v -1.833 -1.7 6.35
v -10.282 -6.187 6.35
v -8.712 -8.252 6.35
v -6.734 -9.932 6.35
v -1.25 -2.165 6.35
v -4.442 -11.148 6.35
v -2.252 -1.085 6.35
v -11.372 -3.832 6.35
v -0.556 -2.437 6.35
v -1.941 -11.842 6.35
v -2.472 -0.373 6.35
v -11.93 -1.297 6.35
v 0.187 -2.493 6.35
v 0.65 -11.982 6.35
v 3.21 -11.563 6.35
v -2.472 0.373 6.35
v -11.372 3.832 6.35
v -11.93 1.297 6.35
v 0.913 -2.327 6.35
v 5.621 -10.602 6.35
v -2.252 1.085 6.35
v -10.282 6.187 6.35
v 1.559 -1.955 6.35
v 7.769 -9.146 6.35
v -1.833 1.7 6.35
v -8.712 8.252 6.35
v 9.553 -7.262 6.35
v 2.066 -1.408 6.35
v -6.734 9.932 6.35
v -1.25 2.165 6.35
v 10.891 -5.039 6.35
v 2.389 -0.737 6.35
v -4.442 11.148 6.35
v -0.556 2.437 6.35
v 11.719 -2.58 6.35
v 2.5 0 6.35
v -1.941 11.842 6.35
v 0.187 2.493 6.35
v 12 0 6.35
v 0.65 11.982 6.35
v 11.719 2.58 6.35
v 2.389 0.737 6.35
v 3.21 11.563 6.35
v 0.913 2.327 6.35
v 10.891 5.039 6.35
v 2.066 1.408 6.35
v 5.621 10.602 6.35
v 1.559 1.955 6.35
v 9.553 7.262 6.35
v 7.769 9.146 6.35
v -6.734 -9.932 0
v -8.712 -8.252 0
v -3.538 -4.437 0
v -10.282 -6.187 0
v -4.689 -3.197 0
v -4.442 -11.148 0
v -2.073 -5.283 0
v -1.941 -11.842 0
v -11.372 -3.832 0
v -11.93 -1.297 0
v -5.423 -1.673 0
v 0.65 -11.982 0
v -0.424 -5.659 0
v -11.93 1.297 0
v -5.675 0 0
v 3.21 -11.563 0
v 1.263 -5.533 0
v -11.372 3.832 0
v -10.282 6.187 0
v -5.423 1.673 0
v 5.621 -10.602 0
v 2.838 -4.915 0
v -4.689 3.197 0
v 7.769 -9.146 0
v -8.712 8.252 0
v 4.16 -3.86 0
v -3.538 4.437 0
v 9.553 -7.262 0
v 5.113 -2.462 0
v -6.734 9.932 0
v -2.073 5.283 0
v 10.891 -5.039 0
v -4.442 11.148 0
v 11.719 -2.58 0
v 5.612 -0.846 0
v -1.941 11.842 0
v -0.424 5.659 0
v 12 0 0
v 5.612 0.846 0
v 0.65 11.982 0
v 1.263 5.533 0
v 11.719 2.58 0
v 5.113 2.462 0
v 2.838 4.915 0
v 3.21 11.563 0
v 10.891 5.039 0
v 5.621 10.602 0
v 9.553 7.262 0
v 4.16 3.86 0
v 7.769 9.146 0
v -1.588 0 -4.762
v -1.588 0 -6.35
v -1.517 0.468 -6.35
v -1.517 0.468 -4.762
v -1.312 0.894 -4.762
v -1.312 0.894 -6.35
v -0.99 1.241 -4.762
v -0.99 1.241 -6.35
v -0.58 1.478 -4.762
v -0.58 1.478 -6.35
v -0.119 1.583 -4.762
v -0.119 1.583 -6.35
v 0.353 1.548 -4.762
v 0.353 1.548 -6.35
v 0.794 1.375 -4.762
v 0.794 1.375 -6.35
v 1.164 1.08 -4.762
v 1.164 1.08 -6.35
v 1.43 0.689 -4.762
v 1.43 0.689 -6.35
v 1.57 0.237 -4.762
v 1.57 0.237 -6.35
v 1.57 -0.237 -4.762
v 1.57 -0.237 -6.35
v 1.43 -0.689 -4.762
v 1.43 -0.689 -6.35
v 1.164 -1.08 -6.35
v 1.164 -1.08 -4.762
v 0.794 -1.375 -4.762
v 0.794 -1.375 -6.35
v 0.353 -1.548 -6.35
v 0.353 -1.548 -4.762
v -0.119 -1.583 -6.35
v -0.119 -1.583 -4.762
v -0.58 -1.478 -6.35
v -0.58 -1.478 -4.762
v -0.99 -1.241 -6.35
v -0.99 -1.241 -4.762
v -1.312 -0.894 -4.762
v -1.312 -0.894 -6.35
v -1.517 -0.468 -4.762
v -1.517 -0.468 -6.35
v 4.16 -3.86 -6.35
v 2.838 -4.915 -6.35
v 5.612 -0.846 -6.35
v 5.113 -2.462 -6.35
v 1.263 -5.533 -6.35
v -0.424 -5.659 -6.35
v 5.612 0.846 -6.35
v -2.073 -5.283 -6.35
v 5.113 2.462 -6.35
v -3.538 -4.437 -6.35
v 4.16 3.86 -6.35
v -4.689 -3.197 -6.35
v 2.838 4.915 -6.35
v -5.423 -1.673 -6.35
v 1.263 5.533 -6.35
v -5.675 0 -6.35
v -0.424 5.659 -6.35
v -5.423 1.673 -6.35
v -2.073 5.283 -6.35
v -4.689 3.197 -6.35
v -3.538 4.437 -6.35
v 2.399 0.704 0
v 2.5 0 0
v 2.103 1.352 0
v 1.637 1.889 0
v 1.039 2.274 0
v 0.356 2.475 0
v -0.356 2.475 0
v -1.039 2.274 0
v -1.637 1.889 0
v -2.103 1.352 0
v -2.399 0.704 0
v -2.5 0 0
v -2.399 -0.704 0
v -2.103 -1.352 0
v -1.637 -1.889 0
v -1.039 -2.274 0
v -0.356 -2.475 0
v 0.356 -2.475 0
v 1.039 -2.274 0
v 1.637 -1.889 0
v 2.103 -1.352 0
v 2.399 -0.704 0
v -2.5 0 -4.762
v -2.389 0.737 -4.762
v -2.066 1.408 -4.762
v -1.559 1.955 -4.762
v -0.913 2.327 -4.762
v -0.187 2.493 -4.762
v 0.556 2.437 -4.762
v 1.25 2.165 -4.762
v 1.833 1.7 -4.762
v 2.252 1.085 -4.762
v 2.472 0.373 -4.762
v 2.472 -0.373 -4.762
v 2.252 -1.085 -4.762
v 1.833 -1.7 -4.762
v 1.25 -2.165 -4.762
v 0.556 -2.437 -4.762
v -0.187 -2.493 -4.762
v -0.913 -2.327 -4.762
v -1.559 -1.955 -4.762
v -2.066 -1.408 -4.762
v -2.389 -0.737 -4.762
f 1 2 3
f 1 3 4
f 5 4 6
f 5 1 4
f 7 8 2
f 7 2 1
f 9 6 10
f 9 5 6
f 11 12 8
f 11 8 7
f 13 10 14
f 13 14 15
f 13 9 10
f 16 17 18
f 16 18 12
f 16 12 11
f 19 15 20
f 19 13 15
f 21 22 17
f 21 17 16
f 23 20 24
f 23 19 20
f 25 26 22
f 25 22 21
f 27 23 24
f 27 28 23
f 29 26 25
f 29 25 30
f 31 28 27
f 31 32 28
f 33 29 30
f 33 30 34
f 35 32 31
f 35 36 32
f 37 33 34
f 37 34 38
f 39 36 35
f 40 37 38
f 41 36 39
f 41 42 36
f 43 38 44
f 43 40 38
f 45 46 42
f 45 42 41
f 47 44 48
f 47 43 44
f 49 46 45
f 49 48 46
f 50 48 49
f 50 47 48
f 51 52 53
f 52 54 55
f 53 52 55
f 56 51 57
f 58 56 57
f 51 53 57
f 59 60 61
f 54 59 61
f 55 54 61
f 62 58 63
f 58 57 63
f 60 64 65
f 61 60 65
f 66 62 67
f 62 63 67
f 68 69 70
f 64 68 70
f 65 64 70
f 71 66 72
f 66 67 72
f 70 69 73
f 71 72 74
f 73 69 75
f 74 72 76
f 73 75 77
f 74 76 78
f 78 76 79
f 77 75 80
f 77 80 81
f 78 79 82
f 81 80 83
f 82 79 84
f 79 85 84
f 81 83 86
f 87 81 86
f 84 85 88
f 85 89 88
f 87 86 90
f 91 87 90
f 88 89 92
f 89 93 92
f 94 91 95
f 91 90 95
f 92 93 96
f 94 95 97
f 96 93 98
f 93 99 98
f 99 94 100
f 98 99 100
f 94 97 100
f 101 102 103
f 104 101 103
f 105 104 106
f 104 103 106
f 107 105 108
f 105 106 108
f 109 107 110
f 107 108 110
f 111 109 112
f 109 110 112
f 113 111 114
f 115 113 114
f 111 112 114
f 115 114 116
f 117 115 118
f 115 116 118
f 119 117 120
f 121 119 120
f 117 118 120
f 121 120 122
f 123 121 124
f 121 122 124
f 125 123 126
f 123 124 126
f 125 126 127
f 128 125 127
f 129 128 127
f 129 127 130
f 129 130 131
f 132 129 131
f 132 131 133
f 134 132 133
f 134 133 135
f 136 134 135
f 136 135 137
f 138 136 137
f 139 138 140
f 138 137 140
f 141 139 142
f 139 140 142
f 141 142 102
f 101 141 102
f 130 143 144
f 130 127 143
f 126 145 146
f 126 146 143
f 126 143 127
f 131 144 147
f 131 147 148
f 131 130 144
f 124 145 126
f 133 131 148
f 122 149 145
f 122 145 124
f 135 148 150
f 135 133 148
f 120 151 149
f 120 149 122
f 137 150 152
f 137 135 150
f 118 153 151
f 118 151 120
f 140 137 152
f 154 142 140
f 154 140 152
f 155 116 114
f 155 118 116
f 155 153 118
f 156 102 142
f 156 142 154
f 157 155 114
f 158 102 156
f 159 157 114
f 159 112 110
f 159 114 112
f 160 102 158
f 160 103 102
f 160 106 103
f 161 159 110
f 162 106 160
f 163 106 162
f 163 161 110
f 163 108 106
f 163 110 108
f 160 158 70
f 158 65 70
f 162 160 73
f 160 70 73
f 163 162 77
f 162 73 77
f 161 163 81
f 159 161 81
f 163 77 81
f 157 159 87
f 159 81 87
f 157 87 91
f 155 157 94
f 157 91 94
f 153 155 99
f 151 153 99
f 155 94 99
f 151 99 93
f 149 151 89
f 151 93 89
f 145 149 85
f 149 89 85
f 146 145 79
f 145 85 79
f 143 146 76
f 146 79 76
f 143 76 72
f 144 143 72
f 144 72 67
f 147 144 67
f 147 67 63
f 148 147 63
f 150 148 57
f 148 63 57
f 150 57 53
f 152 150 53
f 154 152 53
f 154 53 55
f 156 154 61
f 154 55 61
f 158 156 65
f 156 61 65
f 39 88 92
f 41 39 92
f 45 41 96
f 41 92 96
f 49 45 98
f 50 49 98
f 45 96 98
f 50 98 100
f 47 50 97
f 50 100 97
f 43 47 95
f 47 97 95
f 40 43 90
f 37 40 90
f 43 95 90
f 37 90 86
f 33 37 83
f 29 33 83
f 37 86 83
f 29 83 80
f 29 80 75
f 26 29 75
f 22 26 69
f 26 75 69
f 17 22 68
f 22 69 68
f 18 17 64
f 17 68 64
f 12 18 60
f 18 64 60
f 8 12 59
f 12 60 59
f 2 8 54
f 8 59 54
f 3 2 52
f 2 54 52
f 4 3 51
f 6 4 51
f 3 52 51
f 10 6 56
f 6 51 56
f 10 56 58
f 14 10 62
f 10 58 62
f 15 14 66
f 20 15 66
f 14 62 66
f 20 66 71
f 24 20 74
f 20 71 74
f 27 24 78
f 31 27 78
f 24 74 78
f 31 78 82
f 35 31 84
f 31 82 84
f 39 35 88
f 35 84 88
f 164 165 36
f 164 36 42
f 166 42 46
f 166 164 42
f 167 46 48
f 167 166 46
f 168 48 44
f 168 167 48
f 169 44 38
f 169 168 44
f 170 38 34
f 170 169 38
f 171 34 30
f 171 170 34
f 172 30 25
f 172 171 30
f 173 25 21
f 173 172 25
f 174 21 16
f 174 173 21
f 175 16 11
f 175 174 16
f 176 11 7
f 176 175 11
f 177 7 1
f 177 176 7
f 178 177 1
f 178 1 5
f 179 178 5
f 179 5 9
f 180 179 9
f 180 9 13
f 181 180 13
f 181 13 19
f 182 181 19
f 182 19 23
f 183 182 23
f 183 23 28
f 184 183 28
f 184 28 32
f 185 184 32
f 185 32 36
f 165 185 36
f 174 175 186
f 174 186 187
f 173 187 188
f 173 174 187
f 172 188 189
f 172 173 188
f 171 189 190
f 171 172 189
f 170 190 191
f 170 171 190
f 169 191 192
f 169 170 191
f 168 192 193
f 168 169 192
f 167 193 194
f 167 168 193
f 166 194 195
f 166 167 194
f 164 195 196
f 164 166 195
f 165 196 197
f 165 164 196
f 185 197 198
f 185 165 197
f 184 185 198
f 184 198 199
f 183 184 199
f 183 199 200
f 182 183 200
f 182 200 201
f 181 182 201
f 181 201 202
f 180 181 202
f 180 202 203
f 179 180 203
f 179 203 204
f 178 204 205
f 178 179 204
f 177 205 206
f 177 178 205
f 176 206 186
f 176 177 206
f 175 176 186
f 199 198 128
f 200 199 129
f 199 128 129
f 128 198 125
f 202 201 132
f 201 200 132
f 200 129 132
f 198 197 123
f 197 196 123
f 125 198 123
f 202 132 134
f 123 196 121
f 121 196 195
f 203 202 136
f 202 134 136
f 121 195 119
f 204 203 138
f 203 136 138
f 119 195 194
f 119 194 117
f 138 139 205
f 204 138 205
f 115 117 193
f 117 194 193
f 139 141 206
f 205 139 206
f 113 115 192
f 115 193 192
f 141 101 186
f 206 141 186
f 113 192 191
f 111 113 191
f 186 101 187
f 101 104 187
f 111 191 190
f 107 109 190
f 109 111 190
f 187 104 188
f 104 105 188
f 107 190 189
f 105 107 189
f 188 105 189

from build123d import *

# Parameters (mm, degrees)
SKETCH1_R           = 12
SKETCH1_R_2         = 2.5
BOSS_EXTRUDE1_DEPTH = 6.35
SKETCH2_R           = 5.675
SKETCH2_R_2         = 2.5
BOSS_EXTRUDE2_DEPTH = 6.35
SKETCH3_R           = 5.675
SKETCH3_R_2         = 1.5875
BOSS_EXTRUDE3_DEPTH = 1.5875


with BuildPart() as part:
    # Sketch1 → Boss-Extrude1 (new body)
    with BuildSketch(Plane.XY):
        Circle(SKETCH1_R)
        Circle(SKETCH1_R_2, mode=Mode.SUBTRACT)
    extrude(amount=BOSS_EXTRUDE1_DEPTH)

    # Sketch2 → Boss-Extrude2 (add)
    with BuildSketch(Plane(origin=(0, 0, 0), x_dir=(-1, 0, 0), z_dir=(0, 0, -1))):
        Circle(SKETCH2_R)
        Circle(SKETCH2_R_2, mode=Mode.SUBTRACT)
    extrude(amount=BOSS_EXTRUDE2_DEPTH)

    # Sketch3 → Boss-Extrude3 (add)
    with BuildSketch(Plane(origin=(0, 0, -6.35), x_dir=(-1, 0, 0), z_dir=(0, 0, -1))):
        Circle(SKETCH3_R)
        Circle(SKETCH3_R_2, mode=Mode.SUBTRACT)
    extrude(amount=-BOSS_EXTRUDE3_DEPTH)


solid = part.part
